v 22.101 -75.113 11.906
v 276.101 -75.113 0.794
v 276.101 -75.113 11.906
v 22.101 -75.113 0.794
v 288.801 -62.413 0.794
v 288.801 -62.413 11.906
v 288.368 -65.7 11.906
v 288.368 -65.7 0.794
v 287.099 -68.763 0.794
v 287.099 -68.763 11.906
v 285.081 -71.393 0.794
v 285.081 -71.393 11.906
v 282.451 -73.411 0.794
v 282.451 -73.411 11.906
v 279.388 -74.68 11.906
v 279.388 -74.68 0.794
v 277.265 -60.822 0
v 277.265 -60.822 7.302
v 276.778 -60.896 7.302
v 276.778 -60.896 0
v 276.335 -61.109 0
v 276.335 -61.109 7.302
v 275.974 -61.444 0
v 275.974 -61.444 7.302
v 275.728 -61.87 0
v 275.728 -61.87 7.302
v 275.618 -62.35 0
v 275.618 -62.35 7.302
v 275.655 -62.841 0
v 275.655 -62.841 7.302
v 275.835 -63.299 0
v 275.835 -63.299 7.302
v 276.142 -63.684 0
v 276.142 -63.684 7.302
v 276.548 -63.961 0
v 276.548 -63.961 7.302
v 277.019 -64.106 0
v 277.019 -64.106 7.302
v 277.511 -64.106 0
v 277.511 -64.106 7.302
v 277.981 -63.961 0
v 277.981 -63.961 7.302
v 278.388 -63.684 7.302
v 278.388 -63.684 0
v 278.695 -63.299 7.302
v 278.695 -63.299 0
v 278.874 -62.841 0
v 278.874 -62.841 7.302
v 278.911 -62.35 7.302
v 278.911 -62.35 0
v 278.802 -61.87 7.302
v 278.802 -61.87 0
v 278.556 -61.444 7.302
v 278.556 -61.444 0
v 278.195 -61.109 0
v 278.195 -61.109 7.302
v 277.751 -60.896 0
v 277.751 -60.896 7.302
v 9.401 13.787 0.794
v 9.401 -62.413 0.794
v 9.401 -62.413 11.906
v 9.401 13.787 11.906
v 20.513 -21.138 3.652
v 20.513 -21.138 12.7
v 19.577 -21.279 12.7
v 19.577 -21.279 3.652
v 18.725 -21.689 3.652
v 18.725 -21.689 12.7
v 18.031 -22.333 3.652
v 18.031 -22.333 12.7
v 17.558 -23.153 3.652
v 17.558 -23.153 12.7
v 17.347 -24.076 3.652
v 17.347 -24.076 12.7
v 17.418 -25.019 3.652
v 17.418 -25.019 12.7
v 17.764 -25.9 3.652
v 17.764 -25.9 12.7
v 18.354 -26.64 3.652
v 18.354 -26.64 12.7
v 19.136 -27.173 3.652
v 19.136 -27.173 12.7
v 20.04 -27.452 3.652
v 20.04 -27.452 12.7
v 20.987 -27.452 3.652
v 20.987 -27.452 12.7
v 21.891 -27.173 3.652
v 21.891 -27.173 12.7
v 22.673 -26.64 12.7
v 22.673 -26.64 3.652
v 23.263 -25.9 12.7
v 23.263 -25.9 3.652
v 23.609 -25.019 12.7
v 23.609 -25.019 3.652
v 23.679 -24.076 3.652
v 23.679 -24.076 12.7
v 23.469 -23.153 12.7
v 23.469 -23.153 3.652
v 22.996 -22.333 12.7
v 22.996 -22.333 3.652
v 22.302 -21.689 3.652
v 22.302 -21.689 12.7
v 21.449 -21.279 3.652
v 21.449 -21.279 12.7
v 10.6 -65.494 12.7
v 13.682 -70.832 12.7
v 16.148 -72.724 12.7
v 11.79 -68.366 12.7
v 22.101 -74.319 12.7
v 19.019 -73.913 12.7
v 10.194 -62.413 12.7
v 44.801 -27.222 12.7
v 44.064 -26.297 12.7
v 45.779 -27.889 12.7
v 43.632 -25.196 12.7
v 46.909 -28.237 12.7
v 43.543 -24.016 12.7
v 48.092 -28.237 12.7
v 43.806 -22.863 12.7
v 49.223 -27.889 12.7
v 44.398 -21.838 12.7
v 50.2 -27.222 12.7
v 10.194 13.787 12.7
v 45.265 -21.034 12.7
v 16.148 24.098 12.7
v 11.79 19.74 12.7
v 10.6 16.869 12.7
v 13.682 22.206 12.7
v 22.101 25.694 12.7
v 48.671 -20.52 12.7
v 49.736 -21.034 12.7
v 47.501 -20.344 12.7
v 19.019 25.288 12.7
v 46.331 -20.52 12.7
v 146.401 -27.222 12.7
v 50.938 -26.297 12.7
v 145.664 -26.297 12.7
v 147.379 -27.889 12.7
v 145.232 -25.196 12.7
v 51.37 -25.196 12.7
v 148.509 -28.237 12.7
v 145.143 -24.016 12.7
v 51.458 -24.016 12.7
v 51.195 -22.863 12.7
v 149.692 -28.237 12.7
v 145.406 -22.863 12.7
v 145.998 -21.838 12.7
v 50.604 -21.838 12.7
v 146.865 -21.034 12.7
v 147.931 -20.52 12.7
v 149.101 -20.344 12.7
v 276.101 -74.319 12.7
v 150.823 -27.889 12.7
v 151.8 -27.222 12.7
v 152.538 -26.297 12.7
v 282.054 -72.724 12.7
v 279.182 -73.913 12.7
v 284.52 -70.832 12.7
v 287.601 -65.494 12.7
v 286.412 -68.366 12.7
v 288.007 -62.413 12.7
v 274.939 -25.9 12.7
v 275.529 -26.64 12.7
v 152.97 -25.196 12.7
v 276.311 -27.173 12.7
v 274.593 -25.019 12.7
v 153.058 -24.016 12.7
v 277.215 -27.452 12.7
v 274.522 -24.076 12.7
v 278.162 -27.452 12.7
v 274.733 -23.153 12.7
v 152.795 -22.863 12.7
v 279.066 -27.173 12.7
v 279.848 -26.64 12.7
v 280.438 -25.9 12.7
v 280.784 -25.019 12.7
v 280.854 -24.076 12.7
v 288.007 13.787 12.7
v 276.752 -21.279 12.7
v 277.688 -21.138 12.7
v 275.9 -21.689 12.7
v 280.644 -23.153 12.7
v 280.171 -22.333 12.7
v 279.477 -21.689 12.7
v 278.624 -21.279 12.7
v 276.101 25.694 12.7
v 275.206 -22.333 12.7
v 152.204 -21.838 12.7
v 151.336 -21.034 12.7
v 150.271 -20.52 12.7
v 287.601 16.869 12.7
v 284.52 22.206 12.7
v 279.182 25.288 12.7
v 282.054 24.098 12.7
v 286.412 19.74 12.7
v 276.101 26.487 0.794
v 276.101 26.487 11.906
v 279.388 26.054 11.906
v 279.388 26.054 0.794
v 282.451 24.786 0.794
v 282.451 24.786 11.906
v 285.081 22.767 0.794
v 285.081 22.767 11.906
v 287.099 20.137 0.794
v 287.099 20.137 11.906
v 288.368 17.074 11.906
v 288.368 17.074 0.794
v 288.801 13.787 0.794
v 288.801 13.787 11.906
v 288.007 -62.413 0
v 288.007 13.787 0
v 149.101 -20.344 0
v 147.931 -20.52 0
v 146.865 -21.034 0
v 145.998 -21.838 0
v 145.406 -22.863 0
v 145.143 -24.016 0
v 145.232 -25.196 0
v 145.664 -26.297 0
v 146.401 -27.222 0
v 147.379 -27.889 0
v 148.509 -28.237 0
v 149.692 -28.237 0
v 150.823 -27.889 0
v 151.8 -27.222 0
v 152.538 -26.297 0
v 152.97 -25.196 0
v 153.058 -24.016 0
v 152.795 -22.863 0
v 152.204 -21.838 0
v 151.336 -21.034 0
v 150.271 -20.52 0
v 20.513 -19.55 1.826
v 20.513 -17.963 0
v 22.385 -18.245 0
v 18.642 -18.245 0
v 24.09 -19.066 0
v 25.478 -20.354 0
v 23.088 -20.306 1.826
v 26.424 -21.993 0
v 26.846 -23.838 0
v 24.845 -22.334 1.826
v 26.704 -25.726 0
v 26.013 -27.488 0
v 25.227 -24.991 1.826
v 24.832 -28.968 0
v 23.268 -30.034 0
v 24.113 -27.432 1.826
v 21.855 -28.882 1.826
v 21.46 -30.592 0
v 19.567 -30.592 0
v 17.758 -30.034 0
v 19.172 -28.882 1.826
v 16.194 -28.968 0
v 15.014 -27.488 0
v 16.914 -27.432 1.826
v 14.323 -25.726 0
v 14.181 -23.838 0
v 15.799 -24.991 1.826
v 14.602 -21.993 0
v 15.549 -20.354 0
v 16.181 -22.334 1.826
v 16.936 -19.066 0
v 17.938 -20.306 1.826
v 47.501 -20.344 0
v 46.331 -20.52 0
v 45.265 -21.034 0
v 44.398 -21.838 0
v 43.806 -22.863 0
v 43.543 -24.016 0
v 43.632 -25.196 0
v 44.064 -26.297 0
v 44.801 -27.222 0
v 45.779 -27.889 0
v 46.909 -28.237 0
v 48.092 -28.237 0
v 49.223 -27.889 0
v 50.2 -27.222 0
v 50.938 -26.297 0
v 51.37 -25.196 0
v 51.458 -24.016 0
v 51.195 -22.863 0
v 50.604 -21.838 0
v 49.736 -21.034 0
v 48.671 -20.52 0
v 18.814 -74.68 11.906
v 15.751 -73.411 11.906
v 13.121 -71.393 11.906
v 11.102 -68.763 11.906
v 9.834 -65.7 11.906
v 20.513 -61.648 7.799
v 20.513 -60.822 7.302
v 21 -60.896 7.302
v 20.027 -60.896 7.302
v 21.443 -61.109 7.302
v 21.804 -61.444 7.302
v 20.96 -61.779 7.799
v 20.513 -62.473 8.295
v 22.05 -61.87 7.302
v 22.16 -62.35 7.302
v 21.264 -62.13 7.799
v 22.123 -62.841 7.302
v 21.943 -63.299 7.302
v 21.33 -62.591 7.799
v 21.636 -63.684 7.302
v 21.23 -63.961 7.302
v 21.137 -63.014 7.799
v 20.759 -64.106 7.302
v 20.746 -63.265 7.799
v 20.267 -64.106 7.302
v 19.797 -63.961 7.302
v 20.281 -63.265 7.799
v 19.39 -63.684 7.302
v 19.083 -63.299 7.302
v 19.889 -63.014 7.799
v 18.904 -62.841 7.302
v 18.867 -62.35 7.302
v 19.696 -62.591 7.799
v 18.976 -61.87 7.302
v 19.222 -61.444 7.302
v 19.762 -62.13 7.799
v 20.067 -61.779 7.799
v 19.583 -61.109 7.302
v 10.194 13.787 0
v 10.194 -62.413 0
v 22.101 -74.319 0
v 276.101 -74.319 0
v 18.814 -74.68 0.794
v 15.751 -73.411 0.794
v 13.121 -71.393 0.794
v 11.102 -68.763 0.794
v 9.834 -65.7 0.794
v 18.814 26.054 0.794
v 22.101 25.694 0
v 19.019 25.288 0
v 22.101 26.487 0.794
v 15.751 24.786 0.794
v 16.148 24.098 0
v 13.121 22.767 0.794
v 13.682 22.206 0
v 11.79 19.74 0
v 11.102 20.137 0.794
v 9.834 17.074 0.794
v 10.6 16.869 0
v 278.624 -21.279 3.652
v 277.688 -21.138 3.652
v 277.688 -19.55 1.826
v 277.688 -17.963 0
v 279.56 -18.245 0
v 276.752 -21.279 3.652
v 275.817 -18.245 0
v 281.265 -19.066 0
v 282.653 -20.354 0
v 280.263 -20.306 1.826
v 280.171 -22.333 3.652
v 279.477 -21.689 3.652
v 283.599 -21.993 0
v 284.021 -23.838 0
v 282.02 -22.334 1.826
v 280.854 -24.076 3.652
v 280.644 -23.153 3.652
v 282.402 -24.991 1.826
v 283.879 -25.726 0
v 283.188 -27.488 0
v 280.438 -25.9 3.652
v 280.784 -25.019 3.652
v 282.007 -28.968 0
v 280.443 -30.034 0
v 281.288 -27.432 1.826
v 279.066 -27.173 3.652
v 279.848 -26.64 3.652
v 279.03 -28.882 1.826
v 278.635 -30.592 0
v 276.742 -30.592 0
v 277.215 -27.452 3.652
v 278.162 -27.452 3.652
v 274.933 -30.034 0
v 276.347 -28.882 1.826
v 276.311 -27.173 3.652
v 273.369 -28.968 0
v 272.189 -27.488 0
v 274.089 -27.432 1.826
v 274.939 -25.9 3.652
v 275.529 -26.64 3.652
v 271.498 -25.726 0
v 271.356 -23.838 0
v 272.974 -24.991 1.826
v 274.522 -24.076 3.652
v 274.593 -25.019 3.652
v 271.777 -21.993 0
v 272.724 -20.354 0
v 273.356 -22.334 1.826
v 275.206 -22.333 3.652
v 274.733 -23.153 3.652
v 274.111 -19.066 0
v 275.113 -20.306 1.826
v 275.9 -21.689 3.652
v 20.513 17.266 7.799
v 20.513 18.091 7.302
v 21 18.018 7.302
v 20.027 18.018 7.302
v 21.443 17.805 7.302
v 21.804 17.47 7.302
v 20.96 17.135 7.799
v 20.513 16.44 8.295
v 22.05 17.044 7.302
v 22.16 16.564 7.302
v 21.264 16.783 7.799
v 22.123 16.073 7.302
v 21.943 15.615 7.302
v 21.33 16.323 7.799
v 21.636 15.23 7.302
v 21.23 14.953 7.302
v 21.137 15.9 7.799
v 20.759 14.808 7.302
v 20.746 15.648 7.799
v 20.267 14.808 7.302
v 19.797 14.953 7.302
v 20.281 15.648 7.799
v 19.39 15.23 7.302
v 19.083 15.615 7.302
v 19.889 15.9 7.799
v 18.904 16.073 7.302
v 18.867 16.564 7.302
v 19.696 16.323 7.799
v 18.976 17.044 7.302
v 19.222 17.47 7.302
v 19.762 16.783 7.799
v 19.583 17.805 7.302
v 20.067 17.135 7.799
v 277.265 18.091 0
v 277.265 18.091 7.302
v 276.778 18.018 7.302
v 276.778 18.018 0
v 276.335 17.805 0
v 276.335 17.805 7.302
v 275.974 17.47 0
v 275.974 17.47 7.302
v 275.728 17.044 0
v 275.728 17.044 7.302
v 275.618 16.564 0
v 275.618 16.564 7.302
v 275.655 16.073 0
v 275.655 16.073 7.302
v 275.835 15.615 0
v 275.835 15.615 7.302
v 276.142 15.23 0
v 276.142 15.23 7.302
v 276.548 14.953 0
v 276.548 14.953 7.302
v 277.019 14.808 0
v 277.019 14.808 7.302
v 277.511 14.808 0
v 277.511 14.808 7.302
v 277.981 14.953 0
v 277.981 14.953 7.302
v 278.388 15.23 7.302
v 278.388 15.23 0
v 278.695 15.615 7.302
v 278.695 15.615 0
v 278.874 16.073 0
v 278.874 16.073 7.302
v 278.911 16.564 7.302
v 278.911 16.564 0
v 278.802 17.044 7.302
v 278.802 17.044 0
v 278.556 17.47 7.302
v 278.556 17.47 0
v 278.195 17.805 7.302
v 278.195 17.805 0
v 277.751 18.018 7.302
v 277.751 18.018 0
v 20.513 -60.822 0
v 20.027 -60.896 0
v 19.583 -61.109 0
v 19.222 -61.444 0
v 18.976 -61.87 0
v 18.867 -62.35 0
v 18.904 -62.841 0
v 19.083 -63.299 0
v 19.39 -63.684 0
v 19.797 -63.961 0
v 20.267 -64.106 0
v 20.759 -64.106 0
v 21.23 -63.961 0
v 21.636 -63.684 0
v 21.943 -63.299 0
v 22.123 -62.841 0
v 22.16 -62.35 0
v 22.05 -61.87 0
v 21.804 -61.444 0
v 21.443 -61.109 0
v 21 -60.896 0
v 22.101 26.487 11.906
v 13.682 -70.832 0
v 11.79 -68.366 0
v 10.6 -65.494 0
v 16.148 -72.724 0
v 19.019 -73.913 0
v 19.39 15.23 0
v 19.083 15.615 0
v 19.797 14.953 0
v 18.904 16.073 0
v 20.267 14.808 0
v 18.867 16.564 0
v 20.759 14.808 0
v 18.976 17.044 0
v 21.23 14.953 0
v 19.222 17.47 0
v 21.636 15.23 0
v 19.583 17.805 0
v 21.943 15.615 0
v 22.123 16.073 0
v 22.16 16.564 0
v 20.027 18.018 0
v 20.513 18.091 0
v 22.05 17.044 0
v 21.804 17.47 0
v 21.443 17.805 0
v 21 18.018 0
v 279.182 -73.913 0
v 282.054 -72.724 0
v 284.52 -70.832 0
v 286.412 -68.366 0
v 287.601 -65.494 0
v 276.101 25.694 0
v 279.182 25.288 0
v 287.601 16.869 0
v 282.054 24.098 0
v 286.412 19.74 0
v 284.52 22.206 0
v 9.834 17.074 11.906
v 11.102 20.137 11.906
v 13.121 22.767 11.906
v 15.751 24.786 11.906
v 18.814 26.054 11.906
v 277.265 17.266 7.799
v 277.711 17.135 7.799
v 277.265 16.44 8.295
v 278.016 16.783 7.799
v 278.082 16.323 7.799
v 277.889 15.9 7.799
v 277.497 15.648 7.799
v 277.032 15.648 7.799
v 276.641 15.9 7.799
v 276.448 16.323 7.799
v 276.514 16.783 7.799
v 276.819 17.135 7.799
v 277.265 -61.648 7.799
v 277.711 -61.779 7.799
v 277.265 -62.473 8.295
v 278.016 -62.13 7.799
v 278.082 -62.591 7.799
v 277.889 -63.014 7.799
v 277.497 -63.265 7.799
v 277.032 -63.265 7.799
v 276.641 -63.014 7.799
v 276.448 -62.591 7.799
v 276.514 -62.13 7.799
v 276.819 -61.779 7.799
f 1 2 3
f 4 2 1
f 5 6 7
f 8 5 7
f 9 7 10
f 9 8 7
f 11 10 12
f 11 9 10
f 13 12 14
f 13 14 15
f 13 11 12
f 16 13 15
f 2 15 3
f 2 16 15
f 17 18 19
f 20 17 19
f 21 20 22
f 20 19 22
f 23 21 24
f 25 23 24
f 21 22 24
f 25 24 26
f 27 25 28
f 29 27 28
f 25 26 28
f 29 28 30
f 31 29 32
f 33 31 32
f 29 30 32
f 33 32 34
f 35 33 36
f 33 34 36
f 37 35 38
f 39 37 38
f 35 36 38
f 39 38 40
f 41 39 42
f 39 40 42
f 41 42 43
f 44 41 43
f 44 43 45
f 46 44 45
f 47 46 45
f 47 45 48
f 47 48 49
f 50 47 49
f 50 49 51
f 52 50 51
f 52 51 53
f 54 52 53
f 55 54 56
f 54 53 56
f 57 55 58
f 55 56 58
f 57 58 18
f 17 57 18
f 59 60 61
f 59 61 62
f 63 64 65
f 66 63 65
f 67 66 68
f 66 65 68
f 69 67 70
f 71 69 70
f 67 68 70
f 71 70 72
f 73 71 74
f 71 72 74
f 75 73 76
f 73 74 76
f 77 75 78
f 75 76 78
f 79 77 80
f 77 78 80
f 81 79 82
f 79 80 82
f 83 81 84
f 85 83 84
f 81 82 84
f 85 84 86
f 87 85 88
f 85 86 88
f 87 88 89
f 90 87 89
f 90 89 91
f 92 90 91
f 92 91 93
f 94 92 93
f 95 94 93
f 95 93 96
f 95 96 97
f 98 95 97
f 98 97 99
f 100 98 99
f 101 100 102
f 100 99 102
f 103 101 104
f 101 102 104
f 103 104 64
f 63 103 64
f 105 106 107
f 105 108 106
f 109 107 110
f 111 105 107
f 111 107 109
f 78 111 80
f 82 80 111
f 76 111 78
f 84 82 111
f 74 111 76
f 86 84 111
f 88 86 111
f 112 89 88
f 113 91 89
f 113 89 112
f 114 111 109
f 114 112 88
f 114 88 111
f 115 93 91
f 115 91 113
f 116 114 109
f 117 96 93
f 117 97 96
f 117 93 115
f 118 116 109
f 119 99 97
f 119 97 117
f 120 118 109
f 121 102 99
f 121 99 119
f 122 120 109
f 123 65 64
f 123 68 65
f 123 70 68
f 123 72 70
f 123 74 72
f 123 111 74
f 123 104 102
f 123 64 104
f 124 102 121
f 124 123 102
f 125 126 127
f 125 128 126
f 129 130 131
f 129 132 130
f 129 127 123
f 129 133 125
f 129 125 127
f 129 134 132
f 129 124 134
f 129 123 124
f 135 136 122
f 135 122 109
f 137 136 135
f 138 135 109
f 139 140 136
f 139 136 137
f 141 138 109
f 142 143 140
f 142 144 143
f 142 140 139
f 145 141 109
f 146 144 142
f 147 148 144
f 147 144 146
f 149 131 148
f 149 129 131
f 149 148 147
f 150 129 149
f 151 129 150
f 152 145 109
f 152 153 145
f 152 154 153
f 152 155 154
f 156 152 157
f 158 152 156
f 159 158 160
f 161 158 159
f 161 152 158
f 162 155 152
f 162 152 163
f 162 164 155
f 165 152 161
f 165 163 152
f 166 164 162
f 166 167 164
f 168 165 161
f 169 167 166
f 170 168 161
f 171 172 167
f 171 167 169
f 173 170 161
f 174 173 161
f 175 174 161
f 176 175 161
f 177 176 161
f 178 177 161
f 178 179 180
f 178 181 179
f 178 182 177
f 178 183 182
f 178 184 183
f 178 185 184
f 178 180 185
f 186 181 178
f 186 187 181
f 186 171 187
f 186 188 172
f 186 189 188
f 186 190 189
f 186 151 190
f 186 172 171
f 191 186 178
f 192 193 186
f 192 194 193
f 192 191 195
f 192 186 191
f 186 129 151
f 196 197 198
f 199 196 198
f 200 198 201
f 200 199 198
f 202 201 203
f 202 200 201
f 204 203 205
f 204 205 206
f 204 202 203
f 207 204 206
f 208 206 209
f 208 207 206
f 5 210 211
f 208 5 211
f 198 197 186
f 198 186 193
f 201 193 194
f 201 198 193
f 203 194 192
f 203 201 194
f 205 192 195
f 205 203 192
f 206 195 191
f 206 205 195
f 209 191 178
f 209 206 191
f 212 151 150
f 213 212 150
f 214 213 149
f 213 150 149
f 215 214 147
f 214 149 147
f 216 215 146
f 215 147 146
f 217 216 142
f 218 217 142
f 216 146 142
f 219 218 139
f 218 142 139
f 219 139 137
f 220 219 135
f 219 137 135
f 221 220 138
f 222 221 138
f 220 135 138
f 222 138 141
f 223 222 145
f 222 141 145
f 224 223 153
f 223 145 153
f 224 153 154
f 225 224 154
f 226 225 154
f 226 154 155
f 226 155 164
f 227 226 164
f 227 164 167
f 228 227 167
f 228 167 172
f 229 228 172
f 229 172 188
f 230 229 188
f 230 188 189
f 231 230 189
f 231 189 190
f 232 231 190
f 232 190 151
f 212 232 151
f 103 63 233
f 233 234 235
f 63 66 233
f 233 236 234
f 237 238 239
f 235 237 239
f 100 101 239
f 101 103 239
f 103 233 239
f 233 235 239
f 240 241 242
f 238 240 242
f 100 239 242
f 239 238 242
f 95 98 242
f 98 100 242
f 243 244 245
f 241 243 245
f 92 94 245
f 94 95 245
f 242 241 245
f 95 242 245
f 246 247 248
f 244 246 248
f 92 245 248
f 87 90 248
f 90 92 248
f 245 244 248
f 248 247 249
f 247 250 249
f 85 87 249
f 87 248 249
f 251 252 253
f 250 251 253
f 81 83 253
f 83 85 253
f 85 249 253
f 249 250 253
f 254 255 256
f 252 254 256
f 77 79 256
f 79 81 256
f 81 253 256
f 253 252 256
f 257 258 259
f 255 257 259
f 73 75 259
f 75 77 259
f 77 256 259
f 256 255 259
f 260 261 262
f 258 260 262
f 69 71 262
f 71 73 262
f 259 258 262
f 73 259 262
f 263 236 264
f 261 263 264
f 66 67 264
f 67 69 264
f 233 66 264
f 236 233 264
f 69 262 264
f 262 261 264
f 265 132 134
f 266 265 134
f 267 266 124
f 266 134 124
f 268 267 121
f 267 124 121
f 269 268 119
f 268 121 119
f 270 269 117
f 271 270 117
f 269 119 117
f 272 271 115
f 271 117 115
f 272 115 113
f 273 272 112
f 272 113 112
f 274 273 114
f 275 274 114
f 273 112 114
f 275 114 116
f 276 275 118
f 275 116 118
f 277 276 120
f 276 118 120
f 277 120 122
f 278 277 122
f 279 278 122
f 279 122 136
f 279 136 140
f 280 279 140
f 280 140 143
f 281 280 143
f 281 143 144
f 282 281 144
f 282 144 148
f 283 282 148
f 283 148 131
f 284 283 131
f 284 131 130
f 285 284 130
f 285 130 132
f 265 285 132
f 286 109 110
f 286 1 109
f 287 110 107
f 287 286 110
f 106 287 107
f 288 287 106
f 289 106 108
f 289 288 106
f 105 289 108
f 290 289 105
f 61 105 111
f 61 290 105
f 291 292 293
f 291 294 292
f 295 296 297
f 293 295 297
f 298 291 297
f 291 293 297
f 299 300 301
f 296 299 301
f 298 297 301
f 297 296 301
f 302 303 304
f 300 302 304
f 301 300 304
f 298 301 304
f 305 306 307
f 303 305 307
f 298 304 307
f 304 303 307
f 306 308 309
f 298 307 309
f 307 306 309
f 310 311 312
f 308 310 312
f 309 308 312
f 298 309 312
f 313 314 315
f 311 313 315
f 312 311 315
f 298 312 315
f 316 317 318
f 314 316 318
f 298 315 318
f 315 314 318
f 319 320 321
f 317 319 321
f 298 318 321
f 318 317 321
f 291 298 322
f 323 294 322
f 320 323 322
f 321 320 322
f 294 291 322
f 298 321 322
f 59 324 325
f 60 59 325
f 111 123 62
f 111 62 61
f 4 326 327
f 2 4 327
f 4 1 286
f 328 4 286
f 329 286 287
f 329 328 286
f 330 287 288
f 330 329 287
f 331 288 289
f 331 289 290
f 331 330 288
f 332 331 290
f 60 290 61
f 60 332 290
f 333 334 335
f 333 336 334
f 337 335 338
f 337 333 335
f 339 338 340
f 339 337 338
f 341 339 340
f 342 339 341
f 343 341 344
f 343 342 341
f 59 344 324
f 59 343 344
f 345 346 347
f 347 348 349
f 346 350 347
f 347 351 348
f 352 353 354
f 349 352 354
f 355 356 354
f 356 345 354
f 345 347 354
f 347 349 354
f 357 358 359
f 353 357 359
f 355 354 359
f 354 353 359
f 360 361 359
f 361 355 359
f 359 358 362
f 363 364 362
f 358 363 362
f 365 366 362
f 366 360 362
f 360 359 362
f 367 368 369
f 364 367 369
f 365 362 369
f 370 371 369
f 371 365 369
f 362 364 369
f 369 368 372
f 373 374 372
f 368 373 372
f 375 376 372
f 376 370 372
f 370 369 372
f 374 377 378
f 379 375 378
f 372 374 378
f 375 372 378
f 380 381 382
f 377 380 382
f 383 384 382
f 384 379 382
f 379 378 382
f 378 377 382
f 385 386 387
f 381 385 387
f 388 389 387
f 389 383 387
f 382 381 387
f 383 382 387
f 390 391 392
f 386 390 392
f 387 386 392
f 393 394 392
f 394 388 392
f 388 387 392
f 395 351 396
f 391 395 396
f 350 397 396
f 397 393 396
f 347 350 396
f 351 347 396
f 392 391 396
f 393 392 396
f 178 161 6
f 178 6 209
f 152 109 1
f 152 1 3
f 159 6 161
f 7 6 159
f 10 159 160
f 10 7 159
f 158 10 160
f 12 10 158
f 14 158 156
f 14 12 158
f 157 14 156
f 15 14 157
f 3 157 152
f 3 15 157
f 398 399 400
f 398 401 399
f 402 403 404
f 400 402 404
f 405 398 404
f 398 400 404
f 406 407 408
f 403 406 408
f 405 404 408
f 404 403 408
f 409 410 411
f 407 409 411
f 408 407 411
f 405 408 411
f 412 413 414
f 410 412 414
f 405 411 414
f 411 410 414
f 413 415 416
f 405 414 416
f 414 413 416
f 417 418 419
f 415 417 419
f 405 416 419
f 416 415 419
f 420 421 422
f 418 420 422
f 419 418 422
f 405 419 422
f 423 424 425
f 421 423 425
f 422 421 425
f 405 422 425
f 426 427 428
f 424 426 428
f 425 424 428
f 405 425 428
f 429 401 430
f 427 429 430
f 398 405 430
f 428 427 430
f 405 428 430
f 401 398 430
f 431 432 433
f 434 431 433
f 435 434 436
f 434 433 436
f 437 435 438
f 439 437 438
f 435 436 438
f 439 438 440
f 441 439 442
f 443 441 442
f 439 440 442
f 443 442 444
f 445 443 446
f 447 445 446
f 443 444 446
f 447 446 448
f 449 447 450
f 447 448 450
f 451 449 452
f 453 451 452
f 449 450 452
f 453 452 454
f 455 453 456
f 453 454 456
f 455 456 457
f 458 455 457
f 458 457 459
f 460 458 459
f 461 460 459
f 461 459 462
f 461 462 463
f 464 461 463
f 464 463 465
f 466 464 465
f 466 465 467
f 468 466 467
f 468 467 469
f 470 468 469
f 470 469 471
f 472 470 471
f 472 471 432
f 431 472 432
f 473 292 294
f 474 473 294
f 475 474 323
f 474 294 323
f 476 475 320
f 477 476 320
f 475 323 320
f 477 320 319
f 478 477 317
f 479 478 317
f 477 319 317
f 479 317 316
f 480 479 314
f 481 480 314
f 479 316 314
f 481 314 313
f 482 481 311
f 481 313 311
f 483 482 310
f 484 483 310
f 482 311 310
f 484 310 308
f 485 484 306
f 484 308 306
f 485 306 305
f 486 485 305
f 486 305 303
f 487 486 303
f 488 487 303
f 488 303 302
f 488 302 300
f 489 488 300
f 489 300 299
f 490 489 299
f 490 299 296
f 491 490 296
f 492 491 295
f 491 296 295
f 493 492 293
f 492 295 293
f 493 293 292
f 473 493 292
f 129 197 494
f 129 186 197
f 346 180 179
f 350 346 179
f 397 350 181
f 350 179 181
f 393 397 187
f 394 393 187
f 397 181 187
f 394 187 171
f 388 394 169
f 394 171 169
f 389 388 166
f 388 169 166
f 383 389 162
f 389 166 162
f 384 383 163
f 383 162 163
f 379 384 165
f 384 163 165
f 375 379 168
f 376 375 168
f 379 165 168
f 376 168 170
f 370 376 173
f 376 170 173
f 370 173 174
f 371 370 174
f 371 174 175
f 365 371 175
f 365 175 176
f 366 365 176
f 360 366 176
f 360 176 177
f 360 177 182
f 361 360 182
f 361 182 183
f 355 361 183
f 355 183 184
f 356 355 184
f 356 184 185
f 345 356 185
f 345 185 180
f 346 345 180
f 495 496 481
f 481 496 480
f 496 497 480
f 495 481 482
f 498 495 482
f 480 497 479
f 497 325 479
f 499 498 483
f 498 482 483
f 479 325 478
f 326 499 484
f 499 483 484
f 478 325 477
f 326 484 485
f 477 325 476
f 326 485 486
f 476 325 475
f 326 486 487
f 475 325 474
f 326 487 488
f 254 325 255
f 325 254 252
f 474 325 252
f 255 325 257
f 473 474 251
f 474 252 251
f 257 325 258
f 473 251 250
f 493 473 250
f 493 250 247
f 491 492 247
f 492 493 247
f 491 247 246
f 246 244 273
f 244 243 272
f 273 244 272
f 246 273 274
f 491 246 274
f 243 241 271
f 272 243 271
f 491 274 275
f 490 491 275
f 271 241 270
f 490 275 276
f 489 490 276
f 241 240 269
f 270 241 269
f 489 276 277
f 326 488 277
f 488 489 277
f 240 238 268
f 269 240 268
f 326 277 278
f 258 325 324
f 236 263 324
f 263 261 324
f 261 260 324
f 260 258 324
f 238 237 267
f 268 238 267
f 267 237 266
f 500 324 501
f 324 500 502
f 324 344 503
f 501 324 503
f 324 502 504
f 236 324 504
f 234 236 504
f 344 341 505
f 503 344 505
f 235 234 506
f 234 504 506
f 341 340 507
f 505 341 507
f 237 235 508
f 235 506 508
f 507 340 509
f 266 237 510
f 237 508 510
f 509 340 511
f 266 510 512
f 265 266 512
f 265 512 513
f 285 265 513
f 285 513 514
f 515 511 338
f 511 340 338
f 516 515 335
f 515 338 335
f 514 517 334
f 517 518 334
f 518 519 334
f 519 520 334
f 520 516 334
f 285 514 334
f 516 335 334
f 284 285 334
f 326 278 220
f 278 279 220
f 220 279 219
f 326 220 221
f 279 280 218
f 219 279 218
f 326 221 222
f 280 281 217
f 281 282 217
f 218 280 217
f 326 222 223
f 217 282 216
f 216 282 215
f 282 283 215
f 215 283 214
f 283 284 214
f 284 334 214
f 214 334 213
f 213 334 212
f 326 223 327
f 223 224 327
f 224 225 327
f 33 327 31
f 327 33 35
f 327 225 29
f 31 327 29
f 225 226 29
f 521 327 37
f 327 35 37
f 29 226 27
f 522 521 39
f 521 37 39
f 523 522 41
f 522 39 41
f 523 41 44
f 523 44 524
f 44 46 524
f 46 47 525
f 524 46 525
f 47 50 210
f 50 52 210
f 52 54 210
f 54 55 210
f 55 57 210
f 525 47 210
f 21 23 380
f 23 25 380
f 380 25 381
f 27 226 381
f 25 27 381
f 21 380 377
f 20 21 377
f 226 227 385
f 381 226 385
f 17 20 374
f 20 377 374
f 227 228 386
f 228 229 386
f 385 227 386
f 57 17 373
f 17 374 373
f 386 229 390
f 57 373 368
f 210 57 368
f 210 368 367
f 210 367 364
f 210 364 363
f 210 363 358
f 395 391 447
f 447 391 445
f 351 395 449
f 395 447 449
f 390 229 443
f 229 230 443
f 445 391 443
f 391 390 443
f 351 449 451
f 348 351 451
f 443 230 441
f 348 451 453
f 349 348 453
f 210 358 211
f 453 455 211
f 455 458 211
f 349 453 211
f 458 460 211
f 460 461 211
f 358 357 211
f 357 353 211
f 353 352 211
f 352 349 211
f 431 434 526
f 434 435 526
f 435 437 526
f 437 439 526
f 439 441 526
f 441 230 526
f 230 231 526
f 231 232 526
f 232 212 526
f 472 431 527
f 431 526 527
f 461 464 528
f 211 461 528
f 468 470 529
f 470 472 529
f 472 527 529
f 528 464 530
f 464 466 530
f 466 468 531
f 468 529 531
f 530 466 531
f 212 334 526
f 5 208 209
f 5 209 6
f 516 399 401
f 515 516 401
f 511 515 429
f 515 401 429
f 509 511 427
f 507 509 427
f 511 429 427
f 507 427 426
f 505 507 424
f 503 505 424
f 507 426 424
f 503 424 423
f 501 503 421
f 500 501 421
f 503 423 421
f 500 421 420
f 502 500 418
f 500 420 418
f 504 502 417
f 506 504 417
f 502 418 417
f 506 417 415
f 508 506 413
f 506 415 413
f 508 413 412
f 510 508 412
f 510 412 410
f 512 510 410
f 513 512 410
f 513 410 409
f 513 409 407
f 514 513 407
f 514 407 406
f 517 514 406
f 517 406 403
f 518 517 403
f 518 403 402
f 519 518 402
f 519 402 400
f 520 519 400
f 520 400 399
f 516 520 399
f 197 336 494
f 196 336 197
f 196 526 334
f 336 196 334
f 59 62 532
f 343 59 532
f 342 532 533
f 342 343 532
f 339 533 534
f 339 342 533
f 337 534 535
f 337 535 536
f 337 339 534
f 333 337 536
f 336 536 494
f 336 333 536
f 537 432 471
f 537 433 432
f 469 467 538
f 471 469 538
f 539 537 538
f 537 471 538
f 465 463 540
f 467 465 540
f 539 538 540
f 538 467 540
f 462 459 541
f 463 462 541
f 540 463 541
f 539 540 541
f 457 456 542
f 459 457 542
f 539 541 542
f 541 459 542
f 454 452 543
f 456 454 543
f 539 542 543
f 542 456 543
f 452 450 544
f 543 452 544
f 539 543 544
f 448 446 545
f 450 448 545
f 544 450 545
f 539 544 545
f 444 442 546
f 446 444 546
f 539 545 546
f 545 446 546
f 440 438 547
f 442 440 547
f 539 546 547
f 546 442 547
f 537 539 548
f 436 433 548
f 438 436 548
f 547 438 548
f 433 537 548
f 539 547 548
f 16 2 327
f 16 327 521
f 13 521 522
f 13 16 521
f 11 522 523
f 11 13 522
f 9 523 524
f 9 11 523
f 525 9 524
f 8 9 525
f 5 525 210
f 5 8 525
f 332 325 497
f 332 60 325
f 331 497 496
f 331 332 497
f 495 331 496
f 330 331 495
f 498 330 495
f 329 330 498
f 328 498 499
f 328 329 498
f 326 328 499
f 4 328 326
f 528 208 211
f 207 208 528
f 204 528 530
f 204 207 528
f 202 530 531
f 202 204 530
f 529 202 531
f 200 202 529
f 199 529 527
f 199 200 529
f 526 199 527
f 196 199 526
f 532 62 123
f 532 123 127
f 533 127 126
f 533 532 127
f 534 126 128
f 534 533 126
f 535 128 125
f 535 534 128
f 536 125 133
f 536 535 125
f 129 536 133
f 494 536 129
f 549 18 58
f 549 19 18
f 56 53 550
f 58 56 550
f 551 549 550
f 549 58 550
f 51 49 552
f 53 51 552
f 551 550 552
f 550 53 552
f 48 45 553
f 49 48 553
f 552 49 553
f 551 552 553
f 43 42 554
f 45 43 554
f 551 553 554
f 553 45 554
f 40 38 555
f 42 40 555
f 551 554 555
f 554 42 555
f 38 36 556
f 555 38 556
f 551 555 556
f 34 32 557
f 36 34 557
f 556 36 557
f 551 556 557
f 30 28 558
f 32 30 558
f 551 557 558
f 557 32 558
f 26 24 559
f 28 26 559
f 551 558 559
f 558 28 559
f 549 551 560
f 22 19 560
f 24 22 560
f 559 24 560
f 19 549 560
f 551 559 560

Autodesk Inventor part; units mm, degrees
ref_plane "YZ Plane" through (0, 0, 0) normal (1, 0, 0) x (0, 1, 0)
ref_plane "XZ Plane" through (0, 0, 0) normal (0, 1, 0) x (-1, 0, 0)
ref_plane "XY Plane" through (0, 0, 0) normal (0, 0, 1) x (1, 0, 0)
sketch "Sketch1" plane through (0, 0, 0) normal (0, 0, 1) x (1, 0, 0)
  line L0 (22.1008, 26.4872) -> (276.1008, 26.4872)
  line L1 (288.8008, 13.7872) -> (288.8008, -62.4128)
  line L2 (276.1008, -75.1128) -> (22.1008, -75.1128)
  line L3 (9.4008, -62.4128) -> (9.4008, 13.7872)
  arc A0 (12.5758, 26.4872) -> (9.4008, 23.3122) centre (12.5758, 23.3122) ccw
  arc A1 (22.1008, 26.4872) -> (9.4008, 13.7872) centre (22.1008, 13.7872) ccw
  arc A2 (9.4008, -62.4128) -> (22.1008, -75.1128) centre (22.1008, -62.4128) ccw
  arc A3 (276.1008, -75.1128) -> (288.8008, -62.4128) centre (276.1008, -62.4128) ccw
  arc A4 (288.8008, 13.7872) -> (276.1008, 26.4872) centre (276.1008, 13.7872) ccw
  point P0 (0, 0)
  point P1 (288.8008, -75.1128)
  point P2 (288.8008, 26.4872)
  point P3 (9.4008, -75.1128)
  point P4 (20.5133, -24.3128)
  point P5 (47.5008, -24.3128)
  point P6 (149.1008, -24.3128)
  point P7 (277.6883, -24.3128)
  dimension "d0" = 279.4
  dimension "d1" = 101.6
  dimension "d3" = 12.7
  dimension "d41" = 11.1125
  dimension "d42" = 11.1125
extrude "Extrusion1" add sketch "Sketch1" along normal blind 12.7
chamfer "Chamfer1" distance 0.7937 angle 45 16 edges at (149.1008, 26.4872, 12.7) (13.1205, 22.7675, 12.7) (9.4008, -24.3128, 12.7) (13.1205, -71.3931, 12.7) (149.1008, -75.1128, 12.7) (285.081, -71.3931, 12.7) (288.8008, -24.3128, 12.7) (285.081, 22.7675, 12.7) (149.1008, 26.4872, 0) (13.1205, 22.7675, 0) (9.4008, -24.3128, 0) (13.1205, -71.3931, 0) (149.1008, -75.1128, 0) (285.081, -71.3931, 0) (288.8008, -24.3128, 0) (285.081, 22.7675, 0)
hole "Hole5" at (20.5133, -24.3128, 0) direction (0, 0, 1) diameter 6.35 end through all countersink diameter 12.7 countersink angle 82
hole "Hole6" at (277.6883, -24.3128, 0) direction (0, 0, 1) diameter 6.35 end through all countersink diameter 12.7 countersink angle 82
hole "Hole7" at (47.5008, -24.3128, 0) at (149.1008, -24.3128, 0) direction (0, 0, 1) diameter 7.9375 end through all
sketch "Sketch2" plane through (0, 0, 0) normal (0, 0, -1) x (-1, 0, 0)
  point P0 (0, 0)
  point P1 (-20.5133, 16.4404)
  point P2 (-20.5133, -62.4734)
  point P3 (-277.2648, -62.4734)
  point P4 (-277.2648, 16.4404)
hole "Hole8" at (20.5133, 16.4404, 0) at (20.5133, -62.4734, 0) at (277.2648, -62.4734, 0) at (277.2648, 16.4404, 0) direction (0, 0, 1) diameter 3.302 depth 7.3025 tip angle 118 thread size "8-32 UNC" class "2B" standard "ANSI Unified Screw Threads"
properties part number "BasePlateTL"
